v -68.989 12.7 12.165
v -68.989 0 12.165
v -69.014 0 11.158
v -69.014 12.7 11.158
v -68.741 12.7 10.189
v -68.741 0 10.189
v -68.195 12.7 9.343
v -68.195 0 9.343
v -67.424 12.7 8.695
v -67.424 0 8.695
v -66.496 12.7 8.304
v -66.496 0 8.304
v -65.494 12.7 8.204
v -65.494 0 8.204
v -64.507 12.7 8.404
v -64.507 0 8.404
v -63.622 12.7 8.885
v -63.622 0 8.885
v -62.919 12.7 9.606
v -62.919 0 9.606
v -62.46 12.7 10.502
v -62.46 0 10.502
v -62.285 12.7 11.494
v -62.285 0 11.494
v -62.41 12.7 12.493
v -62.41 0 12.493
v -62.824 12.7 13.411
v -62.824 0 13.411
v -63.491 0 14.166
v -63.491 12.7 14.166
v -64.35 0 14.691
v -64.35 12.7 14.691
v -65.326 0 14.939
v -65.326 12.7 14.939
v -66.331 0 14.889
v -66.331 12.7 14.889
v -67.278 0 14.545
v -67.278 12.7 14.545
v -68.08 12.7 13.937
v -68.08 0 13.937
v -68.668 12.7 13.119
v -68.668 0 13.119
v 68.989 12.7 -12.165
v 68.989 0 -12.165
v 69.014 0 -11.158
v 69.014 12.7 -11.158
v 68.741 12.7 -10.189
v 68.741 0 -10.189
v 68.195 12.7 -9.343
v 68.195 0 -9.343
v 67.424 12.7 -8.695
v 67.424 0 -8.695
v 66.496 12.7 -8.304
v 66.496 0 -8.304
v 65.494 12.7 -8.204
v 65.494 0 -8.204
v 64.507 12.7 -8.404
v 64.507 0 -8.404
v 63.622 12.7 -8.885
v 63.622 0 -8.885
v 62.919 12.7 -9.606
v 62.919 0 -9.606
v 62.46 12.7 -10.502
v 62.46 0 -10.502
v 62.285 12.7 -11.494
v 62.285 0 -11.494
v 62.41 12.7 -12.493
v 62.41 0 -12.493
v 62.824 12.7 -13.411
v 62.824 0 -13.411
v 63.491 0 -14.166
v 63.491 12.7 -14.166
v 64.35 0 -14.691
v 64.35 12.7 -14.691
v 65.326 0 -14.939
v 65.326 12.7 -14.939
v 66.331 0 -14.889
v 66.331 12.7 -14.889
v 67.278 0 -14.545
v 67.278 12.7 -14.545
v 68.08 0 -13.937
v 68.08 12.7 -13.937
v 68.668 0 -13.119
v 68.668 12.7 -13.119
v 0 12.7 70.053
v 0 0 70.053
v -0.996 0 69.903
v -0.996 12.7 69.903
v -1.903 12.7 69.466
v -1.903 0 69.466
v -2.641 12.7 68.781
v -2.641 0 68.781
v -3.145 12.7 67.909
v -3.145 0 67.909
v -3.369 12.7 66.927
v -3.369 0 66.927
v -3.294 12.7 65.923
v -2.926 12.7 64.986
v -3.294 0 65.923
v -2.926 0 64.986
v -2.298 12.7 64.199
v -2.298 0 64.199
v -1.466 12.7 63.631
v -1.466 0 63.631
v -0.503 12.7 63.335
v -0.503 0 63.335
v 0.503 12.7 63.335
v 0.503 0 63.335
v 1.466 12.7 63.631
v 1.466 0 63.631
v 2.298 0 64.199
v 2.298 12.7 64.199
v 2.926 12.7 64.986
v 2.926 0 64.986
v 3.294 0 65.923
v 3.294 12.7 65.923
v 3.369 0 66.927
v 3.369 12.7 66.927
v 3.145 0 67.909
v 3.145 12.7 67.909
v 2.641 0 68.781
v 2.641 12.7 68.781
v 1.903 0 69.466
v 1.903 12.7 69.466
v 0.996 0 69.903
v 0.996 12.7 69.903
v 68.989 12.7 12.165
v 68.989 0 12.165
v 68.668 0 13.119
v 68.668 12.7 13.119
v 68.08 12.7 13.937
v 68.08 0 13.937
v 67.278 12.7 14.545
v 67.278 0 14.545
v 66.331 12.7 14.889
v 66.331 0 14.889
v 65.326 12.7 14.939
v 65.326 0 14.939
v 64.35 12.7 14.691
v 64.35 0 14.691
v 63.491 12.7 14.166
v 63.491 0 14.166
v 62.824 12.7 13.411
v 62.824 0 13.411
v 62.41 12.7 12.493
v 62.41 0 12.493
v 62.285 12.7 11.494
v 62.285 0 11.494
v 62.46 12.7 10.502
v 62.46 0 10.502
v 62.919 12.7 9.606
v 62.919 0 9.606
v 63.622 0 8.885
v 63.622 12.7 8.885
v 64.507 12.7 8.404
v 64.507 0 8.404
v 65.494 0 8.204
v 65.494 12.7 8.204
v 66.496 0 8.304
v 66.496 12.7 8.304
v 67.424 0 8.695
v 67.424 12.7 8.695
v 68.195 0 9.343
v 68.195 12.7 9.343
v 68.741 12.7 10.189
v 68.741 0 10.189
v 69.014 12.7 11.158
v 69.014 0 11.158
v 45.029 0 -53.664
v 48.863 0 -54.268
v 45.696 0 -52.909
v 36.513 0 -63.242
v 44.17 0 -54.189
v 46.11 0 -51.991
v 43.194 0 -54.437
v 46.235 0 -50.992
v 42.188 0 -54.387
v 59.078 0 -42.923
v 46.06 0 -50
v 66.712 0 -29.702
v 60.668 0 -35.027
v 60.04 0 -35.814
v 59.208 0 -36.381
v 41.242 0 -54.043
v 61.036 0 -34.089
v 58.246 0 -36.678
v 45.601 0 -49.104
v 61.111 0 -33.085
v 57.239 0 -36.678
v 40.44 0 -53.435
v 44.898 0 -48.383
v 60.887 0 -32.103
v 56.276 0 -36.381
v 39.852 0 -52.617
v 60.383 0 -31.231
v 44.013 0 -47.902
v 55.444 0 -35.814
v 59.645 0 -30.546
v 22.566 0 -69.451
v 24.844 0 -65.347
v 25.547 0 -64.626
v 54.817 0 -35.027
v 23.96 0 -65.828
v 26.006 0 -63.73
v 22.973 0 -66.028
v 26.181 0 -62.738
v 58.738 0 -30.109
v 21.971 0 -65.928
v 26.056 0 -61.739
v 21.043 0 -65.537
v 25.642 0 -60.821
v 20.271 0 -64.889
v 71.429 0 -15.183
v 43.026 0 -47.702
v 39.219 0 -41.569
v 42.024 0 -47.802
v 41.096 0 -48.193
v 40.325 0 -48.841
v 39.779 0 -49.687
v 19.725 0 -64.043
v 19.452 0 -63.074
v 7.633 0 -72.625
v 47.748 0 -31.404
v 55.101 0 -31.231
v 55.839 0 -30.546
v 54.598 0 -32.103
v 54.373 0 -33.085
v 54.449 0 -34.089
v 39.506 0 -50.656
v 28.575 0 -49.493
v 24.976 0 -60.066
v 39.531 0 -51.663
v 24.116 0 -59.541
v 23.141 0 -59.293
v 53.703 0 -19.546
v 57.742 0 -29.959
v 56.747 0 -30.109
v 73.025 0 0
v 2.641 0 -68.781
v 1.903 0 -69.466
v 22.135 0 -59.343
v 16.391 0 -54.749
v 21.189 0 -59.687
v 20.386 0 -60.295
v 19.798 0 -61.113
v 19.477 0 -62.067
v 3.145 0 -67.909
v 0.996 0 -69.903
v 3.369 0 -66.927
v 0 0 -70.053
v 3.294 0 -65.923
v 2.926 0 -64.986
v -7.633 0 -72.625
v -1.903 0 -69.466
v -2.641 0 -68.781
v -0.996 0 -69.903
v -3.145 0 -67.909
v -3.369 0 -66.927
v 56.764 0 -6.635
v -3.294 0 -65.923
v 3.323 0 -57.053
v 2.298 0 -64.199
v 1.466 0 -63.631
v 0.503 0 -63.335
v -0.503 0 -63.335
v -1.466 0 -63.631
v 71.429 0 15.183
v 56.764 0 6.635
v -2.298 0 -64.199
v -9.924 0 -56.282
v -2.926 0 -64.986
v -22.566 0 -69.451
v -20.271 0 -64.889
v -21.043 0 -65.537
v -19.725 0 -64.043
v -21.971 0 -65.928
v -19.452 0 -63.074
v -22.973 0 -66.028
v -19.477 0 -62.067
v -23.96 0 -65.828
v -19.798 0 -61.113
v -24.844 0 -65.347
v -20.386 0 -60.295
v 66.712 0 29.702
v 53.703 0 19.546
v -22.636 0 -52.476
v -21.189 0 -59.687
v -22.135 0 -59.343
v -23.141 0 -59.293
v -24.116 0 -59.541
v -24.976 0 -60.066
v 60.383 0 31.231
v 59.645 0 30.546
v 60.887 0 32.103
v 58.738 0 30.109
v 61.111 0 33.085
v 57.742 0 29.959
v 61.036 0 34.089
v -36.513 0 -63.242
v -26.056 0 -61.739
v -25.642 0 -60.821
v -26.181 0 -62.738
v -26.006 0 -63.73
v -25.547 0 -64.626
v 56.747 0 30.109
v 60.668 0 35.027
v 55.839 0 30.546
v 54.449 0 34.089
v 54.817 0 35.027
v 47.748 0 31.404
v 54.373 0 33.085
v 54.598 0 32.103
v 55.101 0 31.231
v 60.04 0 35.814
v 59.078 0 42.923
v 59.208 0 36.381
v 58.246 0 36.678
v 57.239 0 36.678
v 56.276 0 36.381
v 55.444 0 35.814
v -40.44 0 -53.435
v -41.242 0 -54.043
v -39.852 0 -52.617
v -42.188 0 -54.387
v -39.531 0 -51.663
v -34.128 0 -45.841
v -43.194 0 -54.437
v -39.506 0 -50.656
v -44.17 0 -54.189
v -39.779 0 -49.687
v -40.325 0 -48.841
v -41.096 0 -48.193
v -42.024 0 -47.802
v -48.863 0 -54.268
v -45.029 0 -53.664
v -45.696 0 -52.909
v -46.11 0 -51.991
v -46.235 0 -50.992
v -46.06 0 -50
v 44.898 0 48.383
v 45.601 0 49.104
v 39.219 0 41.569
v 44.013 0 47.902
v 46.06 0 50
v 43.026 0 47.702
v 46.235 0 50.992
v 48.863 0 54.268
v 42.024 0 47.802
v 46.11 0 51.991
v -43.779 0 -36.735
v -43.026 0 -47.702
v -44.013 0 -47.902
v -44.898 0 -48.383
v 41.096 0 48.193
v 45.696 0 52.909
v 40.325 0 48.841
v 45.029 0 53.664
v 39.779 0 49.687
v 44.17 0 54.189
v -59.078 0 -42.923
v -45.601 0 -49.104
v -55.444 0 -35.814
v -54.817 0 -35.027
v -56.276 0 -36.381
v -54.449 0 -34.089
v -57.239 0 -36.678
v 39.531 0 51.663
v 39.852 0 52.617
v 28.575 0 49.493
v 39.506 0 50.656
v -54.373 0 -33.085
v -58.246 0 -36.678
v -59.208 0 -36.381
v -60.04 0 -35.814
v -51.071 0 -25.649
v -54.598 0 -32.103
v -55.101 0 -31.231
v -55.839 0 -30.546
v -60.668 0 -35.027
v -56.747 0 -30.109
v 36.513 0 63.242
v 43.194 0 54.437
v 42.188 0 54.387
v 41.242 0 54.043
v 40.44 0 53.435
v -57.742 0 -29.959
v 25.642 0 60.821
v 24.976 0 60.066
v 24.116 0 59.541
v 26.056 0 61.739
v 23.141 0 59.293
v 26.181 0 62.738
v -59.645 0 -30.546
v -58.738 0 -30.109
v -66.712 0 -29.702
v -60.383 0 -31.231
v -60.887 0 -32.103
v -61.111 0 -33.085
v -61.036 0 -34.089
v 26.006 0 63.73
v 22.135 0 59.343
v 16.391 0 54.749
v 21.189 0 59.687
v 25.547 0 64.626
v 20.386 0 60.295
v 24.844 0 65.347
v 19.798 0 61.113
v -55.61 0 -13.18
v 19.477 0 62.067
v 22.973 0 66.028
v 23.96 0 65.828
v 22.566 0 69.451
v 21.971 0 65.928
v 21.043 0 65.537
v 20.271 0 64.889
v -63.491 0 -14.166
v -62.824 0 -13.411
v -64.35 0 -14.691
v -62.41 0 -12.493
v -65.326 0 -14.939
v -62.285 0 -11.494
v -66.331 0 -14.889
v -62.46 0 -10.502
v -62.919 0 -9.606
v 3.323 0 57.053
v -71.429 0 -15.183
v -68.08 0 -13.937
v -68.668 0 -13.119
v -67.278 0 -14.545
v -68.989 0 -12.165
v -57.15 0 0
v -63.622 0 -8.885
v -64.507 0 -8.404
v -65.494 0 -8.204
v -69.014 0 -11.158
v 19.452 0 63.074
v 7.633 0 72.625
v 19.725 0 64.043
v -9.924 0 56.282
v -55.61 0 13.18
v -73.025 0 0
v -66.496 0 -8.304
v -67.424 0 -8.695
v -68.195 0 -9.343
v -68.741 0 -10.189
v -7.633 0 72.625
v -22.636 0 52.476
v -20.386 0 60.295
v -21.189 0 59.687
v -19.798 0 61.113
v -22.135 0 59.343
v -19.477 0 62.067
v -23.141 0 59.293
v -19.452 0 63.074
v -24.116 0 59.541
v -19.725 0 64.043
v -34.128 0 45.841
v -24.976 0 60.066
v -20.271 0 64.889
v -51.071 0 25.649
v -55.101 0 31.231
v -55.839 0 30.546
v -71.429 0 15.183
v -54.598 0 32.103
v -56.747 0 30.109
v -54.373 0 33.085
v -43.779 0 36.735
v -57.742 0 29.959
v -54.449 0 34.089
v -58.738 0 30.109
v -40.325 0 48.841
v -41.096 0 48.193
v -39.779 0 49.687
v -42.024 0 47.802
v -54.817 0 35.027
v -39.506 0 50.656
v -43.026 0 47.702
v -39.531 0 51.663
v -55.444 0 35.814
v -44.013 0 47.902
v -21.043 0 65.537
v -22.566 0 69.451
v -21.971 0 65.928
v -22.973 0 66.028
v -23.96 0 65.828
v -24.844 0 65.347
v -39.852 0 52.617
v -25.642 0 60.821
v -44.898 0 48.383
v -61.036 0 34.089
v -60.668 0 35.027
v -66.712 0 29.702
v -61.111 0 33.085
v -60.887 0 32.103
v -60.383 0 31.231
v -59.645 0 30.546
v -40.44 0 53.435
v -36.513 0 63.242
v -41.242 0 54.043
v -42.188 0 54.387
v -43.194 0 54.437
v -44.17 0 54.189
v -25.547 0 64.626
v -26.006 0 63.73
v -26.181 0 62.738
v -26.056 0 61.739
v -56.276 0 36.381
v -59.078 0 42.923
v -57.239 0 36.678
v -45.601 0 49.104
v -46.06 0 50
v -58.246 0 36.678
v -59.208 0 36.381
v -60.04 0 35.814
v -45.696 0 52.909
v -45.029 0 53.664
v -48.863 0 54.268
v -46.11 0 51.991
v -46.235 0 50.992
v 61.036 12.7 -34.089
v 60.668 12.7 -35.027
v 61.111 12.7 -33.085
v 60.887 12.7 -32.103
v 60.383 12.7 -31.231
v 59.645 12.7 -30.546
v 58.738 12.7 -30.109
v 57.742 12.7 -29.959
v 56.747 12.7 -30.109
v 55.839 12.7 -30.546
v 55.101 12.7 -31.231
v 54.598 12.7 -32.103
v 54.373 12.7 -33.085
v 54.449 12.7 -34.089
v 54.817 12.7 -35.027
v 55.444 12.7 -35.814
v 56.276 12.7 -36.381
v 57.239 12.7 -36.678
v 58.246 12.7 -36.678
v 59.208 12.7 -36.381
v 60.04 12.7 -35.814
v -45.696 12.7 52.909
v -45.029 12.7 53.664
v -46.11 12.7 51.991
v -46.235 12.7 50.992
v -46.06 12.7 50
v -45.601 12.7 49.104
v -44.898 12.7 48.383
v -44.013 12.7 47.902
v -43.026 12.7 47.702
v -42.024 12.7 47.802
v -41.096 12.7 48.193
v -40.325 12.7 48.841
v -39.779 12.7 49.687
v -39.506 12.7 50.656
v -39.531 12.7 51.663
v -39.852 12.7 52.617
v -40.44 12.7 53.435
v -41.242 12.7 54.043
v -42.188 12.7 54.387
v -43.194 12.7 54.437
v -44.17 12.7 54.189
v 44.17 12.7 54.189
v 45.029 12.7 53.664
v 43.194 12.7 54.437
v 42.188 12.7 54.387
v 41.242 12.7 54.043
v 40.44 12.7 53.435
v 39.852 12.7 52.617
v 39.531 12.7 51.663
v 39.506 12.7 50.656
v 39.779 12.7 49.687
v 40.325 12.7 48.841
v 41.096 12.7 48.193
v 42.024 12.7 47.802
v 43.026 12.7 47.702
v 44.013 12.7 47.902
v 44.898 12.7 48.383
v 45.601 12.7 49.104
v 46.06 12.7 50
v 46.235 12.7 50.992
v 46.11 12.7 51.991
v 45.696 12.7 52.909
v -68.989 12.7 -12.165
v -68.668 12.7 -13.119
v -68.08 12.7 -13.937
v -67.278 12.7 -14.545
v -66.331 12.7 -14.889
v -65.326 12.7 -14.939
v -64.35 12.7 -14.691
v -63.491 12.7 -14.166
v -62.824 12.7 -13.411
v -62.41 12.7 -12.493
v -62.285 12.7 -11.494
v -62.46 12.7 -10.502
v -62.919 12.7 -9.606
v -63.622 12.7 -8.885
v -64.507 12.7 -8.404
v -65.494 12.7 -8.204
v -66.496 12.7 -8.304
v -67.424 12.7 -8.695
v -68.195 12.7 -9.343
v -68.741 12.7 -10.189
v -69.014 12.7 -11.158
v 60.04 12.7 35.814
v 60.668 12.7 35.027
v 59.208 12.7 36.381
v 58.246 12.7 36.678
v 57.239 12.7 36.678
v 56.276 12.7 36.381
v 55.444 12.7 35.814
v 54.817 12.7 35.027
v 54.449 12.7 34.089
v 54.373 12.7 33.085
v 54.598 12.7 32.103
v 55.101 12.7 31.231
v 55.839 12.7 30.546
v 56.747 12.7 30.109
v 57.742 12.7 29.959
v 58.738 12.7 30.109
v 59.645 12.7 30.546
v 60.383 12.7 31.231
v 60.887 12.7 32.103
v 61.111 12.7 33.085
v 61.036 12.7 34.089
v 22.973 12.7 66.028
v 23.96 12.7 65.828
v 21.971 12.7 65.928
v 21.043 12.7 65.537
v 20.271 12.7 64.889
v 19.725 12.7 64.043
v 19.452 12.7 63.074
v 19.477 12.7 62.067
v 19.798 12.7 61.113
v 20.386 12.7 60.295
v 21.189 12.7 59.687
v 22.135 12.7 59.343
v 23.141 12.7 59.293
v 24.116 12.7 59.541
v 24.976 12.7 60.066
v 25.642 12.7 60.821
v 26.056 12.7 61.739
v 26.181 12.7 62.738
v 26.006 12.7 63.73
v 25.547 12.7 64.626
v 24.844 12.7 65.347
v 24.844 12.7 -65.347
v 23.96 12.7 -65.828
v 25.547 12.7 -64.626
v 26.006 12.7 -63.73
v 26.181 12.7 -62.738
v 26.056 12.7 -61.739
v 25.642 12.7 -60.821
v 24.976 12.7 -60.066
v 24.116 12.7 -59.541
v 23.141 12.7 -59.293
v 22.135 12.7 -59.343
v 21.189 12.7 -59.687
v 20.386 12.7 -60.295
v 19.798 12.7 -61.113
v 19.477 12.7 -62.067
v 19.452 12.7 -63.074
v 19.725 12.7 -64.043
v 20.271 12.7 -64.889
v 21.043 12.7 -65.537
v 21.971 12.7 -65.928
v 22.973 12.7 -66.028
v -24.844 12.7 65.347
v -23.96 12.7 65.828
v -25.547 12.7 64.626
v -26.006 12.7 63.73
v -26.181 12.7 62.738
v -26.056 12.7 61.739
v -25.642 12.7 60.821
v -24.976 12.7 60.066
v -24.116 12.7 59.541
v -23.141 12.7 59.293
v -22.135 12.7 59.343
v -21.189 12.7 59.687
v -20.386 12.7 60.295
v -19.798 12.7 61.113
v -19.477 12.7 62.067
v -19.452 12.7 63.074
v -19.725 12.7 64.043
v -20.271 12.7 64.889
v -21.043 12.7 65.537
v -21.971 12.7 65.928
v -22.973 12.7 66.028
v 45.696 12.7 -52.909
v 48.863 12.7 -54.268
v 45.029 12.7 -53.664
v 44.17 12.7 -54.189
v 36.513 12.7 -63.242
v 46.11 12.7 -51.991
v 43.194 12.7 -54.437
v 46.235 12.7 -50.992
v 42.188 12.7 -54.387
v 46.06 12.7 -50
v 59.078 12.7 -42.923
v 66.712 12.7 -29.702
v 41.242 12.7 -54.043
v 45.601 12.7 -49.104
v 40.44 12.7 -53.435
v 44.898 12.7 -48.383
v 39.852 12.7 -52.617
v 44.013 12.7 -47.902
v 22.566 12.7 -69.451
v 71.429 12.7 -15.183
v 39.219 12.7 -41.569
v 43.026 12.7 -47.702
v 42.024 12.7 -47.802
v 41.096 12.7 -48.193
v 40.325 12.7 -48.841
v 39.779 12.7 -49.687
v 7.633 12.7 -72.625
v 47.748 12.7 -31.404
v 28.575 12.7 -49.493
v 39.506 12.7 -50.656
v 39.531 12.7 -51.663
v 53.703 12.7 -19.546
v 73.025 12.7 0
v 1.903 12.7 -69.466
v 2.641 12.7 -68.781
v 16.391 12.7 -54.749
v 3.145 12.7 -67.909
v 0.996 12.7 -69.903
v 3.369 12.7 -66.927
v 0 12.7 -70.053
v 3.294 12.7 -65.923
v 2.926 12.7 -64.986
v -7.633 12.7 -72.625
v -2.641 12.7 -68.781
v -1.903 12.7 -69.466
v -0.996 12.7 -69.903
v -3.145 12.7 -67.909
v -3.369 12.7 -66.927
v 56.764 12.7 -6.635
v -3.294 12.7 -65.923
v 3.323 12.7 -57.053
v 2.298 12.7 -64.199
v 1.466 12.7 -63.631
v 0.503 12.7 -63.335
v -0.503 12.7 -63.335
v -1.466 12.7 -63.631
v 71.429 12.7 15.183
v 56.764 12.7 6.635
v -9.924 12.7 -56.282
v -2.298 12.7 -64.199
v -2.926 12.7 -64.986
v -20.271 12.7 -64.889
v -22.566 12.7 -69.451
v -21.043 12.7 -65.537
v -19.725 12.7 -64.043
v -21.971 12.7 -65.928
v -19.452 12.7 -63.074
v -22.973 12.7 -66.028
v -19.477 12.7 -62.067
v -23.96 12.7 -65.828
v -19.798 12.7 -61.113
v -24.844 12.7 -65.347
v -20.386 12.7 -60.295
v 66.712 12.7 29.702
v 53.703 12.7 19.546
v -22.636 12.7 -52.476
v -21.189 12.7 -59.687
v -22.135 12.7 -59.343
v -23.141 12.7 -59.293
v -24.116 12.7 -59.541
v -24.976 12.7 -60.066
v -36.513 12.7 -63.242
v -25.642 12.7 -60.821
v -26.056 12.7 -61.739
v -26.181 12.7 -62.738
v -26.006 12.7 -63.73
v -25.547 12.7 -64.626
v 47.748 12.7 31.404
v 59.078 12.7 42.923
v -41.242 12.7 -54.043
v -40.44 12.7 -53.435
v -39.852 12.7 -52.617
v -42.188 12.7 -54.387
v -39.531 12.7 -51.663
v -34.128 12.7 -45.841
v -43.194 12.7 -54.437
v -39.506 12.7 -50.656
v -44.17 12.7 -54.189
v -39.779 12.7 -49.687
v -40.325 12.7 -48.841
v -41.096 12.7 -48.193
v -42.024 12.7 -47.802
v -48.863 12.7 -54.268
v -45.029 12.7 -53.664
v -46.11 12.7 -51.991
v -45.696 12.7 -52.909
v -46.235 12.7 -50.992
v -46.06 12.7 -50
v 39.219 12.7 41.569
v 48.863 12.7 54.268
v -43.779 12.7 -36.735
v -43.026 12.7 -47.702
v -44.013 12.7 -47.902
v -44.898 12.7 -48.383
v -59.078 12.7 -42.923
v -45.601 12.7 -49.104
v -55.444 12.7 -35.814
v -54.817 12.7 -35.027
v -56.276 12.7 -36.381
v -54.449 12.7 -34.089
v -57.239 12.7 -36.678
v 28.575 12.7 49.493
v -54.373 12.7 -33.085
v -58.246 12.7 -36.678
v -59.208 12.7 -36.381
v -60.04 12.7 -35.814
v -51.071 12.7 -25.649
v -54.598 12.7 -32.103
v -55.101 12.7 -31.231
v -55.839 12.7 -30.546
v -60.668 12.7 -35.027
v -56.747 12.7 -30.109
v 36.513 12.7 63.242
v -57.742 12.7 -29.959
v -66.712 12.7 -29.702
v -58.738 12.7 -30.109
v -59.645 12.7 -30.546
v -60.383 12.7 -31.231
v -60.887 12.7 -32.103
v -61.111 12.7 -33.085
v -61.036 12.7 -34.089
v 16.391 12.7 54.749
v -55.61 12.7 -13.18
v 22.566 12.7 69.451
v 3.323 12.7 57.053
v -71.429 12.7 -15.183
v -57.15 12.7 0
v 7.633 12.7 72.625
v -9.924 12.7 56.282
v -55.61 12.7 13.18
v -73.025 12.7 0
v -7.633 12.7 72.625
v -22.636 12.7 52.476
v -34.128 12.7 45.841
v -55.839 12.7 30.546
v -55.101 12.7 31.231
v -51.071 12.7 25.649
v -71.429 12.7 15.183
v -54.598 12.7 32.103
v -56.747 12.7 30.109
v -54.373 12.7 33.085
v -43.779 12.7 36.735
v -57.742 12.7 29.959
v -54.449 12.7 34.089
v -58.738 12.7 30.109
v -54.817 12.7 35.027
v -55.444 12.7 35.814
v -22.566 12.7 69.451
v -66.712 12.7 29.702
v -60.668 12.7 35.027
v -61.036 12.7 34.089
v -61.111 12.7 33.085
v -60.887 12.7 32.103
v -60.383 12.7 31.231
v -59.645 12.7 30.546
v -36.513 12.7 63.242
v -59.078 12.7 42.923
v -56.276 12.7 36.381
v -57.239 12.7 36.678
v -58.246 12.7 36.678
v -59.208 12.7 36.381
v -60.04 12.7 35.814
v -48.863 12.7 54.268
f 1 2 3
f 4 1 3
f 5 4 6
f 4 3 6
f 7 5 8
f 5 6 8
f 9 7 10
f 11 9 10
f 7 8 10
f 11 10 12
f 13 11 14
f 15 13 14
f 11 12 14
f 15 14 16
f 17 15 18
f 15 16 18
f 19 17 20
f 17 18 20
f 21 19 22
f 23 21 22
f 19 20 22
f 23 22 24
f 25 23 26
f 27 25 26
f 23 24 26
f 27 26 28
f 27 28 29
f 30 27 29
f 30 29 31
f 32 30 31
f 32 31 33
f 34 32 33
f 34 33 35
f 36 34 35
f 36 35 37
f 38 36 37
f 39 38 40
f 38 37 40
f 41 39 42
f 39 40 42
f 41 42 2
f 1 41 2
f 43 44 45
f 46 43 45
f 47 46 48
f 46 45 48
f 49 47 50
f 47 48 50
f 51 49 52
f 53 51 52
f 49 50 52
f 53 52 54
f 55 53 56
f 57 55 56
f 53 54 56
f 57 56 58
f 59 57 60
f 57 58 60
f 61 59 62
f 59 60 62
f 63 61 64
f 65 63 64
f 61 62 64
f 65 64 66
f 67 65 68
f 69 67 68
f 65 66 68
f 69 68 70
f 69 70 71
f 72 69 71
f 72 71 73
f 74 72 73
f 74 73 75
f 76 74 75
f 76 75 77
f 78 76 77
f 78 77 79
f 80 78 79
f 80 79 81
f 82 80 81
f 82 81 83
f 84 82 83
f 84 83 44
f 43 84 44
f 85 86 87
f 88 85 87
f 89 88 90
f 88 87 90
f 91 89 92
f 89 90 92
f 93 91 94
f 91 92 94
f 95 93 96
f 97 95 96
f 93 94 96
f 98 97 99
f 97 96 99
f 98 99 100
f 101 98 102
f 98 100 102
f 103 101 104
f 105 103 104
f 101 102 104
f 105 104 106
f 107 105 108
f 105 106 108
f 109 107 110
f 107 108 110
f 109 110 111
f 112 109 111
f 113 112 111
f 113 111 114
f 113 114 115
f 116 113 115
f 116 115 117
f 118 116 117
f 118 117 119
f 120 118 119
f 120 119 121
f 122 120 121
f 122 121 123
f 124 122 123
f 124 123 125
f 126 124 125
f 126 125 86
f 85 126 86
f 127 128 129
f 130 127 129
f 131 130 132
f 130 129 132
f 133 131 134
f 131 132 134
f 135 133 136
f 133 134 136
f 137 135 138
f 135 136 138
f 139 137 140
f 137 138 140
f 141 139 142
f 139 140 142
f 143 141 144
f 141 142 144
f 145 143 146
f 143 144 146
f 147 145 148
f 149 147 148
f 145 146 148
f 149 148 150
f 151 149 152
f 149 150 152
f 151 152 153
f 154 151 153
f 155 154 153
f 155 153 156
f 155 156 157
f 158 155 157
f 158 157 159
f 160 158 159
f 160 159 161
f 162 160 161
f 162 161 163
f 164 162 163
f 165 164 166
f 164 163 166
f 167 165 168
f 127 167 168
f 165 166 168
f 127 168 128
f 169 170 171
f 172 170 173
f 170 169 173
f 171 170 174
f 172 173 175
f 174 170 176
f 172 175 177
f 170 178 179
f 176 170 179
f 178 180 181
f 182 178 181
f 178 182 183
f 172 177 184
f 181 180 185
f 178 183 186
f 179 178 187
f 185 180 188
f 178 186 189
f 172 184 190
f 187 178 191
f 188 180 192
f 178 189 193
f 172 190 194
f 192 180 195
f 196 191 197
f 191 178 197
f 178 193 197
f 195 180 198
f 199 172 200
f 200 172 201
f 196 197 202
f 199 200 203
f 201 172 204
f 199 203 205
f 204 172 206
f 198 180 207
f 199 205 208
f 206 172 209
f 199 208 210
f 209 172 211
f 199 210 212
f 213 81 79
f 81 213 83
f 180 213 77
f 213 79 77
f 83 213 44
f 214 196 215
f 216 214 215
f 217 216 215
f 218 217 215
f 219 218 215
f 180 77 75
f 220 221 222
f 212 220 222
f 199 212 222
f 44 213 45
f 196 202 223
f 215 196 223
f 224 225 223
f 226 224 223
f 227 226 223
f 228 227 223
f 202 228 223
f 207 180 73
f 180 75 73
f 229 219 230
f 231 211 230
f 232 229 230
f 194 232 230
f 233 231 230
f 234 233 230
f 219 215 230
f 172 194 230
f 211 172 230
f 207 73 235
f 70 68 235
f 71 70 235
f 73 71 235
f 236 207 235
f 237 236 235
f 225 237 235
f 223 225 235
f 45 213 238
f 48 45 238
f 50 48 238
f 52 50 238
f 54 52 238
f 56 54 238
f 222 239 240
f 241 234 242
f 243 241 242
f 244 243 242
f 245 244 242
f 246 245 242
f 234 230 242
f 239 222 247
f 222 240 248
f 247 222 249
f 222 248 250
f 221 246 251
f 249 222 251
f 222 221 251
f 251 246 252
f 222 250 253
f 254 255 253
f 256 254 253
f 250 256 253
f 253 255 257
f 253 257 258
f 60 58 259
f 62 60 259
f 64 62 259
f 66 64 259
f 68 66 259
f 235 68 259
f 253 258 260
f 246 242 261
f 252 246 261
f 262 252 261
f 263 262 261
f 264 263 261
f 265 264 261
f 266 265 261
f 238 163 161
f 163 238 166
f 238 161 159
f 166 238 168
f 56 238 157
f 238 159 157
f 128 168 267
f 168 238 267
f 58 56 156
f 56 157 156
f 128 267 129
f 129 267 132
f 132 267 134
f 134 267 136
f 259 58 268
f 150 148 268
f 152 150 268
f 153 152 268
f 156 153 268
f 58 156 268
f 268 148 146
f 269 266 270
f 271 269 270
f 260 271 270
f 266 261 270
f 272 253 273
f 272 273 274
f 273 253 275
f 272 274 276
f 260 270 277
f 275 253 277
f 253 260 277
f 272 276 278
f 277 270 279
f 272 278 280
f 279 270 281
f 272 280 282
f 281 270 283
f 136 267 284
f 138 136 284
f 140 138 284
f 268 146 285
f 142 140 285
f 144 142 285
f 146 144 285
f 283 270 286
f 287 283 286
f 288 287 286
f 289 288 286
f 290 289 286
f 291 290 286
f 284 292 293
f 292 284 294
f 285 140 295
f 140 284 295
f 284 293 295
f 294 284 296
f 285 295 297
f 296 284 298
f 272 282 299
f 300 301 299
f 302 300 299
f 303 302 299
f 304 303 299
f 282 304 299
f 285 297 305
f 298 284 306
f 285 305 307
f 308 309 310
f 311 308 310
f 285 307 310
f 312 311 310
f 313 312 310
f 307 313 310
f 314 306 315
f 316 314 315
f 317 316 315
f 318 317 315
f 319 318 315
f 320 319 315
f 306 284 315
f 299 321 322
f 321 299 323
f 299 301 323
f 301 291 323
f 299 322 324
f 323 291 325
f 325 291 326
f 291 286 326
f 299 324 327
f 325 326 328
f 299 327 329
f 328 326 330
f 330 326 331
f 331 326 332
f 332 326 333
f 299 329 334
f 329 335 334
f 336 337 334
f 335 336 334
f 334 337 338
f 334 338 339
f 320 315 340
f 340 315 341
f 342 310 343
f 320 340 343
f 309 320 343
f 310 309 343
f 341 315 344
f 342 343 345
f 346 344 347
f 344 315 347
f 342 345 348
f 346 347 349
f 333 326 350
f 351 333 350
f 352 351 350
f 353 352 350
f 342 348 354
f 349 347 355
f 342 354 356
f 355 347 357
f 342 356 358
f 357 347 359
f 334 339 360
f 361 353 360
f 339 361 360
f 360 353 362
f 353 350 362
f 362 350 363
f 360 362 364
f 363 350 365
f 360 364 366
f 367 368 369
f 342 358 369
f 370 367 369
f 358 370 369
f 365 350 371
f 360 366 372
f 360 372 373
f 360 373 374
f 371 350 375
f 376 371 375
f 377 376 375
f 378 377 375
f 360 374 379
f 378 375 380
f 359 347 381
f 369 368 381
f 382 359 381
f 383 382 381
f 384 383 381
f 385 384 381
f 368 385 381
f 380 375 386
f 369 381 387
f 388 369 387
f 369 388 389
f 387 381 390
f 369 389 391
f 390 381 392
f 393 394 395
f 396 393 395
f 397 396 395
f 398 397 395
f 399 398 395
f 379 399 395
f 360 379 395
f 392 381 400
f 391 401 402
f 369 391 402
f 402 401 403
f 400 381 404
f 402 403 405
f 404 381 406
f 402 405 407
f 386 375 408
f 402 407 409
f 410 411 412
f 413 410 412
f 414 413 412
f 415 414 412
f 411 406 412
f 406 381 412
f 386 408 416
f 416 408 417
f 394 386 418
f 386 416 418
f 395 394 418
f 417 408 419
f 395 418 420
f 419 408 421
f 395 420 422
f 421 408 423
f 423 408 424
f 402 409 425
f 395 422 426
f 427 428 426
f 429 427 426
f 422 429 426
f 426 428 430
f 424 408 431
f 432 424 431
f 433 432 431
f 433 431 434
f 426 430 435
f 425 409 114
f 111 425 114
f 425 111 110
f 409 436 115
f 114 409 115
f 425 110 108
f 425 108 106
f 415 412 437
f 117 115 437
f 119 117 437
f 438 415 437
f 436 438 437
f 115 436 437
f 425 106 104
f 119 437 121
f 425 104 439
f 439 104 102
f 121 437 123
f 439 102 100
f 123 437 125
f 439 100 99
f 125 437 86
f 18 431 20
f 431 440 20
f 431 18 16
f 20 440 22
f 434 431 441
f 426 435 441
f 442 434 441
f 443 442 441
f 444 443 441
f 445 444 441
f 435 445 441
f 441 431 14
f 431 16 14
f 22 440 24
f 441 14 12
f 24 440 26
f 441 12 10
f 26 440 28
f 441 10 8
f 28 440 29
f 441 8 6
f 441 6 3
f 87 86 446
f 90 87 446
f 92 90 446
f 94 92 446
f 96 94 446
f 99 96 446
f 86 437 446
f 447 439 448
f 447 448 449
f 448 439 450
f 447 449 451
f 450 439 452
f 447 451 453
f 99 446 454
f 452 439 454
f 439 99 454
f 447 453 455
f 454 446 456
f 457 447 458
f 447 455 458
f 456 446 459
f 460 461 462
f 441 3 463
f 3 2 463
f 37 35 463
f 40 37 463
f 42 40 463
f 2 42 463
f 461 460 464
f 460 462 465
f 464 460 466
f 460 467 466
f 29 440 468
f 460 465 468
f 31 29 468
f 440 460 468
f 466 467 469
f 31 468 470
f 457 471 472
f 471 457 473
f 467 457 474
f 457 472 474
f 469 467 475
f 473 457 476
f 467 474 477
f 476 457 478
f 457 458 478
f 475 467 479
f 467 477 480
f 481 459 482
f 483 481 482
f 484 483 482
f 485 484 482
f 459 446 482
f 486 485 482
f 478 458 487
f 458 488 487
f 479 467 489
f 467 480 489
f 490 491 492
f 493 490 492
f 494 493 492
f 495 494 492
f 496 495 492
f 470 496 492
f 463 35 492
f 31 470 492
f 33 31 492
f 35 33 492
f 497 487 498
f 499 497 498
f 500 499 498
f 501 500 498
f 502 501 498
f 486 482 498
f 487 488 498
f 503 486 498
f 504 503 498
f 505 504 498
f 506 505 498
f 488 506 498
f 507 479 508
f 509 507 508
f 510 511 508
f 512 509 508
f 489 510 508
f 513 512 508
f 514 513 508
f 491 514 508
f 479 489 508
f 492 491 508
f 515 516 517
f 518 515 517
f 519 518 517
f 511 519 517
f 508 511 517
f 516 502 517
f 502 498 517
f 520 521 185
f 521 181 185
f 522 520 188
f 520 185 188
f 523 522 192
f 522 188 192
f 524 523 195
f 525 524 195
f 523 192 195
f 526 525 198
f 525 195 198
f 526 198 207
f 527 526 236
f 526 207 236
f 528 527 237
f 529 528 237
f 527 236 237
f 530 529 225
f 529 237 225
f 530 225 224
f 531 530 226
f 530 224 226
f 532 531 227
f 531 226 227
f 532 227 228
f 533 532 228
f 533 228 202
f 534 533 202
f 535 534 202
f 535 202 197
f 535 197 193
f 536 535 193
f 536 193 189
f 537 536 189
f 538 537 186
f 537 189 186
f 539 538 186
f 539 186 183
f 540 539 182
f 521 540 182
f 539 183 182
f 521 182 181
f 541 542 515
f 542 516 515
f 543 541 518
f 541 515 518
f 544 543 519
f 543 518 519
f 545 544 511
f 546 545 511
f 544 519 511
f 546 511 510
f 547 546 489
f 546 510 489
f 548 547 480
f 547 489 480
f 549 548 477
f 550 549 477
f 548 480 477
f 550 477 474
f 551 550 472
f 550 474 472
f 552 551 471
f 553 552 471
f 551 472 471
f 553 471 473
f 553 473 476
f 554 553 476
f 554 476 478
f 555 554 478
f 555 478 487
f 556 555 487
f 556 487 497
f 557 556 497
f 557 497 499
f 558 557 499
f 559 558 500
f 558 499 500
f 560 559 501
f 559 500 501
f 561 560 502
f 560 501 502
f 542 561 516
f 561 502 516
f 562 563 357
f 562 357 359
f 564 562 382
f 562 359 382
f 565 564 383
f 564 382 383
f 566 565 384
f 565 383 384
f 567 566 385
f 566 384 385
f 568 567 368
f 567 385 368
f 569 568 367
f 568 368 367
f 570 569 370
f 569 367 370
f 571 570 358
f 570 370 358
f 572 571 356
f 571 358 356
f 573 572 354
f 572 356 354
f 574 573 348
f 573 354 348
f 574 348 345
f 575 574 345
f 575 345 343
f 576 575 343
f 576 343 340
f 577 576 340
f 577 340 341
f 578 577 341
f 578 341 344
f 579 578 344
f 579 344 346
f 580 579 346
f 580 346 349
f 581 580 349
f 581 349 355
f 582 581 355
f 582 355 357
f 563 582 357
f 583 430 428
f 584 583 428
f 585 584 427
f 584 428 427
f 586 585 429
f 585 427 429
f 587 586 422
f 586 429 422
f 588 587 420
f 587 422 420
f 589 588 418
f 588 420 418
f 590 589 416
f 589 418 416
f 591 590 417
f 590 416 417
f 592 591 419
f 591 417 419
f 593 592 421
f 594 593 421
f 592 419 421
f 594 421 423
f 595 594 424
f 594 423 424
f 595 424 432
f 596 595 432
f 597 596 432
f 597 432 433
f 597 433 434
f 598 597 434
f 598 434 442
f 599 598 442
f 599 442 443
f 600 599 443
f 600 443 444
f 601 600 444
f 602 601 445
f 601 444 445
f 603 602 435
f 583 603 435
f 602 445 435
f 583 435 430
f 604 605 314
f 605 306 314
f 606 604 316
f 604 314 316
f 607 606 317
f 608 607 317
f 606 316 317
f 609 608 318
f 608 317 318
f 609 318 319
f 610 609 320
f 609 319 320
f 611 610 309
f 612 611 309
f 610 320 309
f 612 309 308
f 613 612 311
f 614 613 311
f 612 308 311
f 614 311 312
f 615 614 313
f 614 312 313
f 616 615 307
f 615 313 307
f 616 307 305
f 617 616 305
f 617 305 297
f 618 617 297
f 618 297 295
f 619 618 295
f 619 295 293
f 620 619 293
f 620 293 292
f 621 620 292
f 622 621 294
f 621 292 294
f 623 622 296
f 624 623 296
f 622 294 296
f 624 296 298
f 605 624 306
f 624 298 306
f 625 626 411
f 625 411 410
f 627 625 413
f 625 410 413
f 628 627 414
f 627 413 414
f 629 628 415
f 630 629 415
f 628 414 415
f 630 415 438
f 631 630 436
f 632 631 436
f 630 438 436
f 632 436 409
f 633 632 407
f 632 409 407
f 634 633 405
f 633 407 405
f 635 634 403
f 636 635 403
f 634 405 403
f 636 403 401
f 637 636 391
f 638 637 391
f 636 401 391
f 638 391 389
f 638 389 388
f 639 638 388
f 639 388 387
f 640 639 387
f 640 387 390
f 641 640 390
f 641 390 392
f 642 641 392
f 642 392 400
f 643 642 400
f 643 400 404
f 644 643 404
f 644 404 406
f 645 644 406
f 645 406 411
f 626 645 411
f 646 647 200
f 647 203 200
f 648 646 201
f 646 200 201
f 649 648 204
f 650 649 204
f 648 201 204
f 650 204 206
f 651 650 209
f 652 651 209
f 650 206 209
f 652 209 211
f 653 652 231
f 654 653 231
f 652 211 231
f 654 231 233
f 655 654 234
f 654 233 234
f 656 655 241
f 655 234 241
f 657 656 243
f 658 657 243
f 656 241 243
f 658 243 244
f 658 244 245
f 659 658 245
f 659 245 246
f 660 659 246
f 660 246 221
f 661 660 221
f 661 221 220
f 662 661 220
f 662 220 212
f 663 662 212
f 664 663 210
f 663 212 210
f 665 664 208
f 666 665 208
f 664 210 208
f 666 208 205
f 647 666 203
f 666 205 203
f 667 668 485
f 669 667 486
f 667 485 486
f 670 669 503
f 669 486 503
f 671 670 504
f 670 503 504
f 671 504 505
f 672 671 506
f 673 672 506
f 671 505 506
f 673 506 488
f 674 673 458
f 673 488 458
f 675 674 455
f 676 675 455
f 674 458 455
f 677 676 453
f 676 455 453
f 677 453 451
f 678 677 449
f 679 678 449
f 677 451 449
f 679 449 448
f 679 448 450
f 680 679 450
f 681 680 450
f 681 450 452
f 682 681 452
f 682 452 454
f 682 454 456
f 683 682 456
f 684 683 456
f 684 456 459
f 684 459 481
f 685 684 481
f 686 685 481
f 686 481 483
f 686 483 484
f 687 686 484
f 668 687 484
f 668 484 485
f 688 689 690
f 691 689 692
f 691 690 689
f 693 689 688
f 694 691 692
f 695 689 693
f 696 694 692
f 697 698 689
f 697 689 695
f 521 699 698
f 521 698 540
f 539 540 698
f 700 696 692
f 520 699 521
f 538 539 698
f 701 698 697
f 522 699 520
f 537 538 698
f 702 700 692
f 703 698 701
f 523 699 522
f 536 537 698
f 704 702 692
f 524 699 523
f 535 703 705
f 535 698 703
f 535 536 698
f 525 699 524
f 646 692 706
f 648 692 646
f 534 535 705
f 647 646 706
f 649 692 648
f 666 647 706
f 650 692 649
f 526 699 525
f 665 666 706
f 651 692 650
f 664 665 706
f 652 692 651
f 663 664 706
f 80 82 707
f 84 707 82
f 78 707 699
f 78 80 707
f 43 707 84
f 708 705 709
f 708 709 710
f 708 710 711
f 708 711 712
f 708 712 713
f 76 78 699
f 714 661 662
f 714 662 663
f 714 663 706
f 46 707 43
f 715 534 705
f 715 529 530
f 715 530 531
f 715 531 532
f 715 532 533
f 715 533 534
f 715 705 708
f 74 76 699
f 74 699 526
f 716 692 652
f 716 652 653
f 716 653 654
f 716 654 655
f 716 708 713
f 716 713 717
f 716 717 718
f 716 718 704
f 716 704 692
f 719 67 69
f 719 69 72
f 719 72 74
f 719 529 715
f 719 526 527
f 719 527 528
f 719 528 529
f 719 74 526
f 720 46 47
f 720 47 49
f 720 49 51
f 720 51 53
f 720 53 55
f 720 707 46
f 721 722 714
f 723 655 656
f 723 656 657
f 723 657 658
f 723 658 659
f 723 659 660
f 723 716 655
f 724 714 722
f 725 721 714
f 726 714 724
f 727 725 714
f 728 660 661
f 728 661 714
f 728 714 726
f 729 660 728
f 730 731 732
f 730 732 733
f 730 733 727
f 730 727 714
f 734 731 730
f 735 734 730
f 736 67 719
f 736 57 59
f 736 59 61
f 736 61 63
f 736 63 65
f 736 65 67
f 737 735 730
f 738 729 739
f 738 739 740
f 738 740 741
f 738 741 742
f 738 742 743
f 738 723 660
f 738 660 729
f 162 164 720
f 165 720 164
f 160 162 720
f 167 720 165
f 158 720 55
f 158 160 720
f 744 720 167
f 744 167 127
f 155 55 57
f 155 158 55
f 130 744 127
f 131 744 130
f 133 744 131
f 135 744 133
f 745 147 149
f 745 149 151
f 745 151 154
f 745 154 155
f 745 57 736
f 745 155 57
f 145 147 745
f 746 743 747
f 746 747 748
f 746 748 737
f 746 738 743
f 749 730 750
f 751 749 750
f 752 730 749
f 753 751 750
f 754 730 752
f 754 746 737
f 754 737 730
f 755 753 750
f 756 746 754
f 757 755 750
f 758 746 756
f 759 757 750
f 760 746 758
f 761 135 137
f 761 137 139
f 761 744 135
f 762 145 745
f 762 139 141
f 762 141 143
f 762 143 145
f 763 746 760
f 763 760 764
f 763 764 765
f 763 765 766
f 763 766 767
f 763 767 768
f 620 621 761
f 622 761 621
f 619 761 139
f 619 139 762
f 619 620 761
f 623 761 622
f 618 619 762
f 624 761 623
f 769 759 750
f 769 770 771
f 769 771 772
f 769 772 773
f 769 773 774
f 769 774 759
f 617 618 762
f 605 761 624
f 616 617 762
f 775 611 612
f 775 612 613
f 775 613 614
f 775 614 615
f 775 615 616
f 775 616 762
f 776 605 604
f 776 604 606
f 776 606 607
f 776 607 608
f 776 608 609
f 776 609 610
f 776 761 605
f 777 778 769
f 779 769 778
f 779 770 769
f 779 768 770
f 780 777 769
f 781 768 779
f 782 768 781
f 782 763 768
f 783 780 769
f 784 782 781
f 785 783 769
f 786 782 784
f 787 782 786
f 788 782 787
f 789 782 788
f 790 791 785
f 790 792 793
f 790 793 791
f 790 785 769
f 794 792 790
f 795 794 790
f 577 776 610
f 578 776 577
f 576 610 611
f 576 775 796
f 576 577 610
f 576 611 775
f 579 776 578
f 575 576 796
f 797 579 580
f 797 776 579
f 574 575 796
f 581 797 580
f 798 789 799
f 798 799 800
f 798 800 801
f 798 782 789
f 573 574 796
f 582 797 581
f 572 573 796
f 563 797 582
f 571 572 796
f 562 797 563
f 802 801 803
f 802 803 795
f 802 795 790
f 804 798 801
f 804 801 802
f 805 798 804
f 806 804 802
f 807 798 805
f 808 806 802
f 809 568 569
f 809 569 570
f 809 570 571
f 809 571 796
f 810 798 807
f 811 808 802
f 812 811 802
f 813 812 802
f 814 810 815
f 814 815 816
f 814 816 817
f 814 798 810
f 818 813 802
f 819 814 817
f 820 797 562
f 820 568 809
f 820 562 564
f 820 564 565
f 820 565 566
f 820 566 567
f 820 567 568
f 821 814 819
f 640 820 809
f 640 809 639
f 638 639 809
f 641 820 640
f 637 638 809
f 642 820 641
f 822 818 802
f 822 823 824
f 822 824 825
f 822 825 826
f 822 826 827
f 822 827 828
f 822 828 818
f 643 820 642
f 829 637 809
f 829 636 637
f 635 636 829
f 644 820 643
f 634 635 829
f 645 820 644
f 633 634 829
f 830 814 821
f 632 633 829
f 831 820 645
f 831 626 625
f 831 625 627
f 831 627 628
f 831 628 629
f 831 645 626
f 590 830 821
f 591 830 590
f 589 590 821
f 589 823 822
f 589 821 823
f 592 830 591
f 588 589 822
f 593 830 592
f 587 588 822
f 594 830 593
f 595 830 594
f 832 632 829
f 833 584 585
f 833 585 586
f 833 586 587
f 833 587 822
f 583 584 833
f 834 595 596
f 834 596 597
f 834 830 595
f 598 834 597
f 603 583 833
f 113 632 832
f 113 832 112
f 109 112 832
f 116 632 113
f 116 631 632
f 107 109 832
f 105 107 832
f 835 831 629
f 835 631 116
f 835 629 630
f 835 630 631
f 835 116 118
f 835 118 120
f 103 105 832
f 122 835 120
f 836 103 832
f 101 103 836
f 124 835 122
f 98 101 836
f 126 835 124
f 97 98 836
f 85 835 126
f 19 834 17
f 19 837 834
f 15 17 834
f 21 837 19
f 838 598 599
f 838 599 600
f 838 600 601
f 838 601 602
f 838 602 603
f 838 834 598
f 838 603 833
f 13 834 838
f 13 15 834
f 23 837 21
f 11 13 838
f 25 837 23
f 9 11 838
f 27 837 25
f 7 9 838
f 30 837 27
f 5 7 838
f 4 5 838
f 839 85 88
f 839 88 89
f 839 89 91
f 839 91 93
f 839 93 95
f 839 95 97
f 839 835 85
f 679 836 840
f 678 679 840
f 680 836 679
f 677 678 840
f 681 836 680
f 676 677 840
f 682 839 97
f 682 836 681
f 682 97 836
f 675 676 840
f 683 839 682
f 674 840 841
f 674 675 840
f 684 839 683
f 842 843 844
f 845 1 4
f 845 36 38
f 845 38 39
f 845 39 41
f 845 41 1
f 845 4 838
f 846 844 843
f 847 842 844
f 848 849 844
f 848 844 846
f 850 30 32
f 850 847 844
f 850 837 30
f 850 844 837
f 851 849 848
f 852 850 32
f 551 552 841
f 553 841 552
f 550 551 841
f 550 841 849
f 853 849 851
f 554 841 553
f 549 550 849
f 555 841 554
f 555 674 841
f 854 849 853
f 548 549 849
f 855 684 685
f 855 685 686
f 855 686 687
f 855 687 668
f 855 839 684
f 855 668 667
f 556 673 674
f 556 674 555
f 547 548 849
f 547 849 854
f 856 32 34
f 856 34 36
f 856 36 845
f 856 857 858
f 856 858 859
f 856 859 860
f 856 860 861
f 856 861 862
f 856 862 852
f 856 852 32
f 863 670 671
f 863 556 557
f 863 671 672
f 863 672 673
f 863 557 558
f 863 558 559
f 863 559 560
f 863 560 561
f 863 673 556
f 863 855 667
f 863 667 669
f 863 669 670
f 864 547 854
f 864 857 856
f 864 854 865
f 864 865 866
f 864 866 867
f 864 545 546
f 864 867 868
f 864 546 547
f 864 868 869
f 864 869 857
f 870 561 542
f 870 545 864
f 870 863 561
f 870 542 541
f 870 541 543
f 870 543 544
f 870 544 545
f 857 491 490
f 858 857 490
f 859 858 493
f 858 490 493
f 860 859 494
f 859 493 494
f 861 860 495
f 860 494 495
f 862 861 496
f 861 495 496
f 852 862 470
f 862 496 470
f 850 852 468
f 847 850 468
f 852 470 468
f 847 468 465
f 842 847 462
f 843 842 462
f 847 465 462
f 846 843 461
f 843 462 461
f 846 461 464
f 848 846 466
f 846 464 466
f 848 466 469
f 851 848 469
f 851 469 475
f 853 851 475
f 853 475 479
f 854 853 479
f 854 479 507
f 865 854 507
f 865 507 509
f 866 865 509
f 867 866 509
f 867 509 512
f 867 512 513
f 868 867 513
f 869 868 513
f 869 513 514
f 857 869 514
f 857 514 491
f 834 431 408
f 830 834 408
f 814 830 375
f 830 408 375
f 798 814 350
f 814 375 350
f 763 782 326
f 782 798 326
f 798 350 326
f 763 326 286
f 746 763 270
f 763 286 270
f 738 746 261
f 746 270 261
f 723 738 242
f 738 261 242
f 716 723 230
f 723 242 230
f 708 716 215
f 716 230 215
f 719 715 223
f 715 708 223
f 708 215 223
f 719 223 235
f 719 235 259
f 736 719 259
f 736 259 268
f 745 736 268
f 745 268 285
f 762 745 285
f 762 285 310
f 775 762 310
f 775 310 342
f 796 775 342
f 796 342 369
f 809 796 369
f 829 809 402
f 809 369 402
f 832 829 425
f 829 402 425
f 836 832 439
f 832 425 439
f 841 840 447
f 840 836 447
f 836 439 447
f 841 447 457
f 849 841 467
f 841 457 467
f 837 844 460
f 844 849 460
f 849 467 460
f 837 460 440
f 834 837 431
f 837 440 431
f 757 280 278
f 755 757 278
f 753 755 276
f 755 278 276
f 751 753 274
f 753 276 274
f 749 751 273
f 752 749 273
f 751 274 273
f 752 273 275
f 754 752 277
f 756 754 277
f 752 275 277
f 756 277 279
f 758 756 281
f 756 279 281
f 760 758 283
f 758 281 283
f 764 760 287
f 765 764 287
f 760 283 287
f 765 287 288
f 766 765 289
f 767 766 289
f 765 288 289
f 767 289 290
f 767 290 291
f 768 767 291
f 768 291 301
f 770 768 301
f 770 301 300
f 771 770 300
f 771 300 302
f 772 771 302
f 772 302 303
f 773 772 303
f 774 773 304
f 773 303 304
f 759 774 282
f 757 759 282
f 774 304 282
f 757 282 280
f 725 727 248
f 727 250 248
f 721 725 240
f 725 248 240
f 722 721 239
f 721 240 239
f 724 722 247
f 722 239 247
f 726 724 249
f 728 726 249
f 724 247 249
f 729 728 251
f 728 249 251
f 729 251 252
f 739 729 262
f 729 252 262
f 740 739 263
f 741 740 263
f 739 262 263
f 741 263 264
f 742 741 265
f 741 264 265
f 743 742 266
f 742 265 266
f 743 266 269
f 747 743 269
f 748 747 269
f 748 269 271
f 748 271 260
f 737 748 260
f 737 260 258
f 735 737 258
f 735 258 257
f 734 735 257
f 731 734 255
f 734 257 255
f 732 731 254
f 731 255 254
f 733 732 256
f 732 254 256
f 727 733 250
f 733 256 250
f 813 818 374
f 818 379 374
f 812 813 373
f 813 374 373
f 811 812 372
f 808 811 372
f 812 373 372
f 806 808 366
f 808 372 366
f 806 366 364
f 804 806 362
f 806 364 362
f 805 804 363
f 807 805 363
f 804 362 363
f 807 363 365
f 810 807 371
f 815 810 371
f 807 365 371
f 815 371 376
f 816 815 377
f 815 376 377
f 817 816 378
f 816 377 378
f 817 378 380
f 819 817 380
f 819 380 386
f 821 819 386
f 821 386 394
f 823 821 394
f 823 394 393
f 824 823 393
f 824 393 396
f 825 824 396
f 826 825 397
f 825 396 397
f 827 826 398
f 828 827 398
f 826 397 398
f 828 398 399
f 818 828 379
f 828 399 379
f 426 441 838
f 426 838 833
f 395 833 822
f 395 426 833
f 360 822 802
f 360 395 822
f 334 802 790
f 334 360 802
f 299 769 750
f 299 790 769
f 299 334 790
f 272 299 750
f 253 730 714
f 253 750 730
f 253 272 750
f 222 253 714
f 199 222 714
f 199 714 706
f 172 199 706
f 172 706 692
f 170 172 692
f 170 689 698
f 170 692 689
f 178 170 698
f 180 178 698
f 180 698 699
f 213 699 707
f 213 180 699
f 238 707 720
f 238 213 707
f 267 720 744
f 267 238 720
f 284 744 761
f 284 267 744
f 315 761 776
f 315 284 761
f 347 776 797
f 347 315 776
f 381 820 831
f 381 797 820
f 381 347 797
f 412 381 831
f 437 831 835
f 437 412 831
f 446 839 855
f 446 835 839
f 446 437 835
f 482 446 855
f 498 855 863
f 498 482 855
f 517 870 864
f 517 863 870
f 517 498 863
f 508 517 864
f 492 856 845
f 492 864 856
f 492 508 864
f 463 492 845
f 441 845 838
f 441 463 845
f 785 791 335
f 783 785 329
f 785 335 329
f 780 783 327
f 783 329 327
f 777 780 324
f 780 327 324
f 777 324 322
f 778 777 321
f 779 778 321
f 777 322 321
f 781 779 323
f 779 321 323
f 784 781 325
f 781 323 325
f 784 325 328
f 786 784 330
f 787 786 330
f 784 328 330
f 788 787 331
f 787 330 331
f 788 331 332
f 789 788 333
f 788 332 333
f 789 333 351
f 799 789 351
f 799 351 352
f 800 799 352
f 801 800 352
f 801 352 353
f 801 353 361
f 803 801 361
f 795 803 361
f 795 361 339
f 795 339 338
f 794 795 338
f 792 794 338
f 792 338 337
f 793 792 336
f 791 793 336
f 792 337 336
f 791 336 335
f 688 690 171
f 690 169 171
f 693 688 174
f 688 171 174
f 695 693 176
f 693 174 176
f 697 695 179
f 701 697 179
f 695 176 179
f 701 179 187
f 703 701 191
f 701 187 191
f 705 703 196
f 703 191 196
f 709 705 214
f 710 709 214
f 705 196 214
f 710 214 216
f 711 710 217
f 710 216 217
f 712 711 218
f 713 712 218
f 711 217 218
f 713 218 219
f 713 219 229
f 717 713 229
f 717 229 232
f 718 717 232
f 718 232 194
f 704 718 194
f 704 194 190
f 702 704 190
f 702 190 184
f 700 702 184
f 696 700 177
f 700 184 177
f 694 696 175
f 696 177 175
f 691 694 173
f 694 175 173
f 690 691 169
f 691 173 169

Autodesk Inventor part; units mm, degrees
ref_plane "YZ Plane" through (0, 0, 0) normal (1, 0, 0) x (0, 1, 0)
ref_plane "XZ Plane" through (0, 0, 0) normal (0, 1, 0) x (-1, 0, 0)
sketch "Sketch1" plane through (0, 0, 0) normal (0, 1, 0) x (-1, 0, 0)
  circle A0 centre (0, 0) radius 57.15
  circle A1 centre (0, 0) radius 73.025
  dimension "d0" = 114.3
  dimension "d25" = 146.05
extrude "Extrusion1" add sketch "Sketch1" along normal blind 12.7
sketch "Sketch4" plane through (0, 12.7, 0) normal (0, 1, 0) x (1, 0, 0)
  line L0 (0, 0) -> (0, -66.675) construction
  line L1 (0, 0) -> (0, -57.15) construction
  circle A0 centre (0, 0) radius 57.15 projected
  dimension "d14" = 66.675
  dimension "d33" = 0
hole "Hole2" at (0, 12.7, 66.675) direction (0, -1, 0) diameter 6.7564 end through all clearance for "Socket Head Cap Screw" size "1/4" standard "Ansi Unified Screw Threads"
pattern_circular "Circular Pattern2" count 18 over 360 about axis through (0, 0, 0) along (0, 1, 0) of "Hole2"
ref_plane "Work Plane1" through (0, 0, -69.85) normal (0, 0, 1) x (1, 0, 0)
properties part number "Injector Plate Retainer Ring" material "Aluminum 6061"
